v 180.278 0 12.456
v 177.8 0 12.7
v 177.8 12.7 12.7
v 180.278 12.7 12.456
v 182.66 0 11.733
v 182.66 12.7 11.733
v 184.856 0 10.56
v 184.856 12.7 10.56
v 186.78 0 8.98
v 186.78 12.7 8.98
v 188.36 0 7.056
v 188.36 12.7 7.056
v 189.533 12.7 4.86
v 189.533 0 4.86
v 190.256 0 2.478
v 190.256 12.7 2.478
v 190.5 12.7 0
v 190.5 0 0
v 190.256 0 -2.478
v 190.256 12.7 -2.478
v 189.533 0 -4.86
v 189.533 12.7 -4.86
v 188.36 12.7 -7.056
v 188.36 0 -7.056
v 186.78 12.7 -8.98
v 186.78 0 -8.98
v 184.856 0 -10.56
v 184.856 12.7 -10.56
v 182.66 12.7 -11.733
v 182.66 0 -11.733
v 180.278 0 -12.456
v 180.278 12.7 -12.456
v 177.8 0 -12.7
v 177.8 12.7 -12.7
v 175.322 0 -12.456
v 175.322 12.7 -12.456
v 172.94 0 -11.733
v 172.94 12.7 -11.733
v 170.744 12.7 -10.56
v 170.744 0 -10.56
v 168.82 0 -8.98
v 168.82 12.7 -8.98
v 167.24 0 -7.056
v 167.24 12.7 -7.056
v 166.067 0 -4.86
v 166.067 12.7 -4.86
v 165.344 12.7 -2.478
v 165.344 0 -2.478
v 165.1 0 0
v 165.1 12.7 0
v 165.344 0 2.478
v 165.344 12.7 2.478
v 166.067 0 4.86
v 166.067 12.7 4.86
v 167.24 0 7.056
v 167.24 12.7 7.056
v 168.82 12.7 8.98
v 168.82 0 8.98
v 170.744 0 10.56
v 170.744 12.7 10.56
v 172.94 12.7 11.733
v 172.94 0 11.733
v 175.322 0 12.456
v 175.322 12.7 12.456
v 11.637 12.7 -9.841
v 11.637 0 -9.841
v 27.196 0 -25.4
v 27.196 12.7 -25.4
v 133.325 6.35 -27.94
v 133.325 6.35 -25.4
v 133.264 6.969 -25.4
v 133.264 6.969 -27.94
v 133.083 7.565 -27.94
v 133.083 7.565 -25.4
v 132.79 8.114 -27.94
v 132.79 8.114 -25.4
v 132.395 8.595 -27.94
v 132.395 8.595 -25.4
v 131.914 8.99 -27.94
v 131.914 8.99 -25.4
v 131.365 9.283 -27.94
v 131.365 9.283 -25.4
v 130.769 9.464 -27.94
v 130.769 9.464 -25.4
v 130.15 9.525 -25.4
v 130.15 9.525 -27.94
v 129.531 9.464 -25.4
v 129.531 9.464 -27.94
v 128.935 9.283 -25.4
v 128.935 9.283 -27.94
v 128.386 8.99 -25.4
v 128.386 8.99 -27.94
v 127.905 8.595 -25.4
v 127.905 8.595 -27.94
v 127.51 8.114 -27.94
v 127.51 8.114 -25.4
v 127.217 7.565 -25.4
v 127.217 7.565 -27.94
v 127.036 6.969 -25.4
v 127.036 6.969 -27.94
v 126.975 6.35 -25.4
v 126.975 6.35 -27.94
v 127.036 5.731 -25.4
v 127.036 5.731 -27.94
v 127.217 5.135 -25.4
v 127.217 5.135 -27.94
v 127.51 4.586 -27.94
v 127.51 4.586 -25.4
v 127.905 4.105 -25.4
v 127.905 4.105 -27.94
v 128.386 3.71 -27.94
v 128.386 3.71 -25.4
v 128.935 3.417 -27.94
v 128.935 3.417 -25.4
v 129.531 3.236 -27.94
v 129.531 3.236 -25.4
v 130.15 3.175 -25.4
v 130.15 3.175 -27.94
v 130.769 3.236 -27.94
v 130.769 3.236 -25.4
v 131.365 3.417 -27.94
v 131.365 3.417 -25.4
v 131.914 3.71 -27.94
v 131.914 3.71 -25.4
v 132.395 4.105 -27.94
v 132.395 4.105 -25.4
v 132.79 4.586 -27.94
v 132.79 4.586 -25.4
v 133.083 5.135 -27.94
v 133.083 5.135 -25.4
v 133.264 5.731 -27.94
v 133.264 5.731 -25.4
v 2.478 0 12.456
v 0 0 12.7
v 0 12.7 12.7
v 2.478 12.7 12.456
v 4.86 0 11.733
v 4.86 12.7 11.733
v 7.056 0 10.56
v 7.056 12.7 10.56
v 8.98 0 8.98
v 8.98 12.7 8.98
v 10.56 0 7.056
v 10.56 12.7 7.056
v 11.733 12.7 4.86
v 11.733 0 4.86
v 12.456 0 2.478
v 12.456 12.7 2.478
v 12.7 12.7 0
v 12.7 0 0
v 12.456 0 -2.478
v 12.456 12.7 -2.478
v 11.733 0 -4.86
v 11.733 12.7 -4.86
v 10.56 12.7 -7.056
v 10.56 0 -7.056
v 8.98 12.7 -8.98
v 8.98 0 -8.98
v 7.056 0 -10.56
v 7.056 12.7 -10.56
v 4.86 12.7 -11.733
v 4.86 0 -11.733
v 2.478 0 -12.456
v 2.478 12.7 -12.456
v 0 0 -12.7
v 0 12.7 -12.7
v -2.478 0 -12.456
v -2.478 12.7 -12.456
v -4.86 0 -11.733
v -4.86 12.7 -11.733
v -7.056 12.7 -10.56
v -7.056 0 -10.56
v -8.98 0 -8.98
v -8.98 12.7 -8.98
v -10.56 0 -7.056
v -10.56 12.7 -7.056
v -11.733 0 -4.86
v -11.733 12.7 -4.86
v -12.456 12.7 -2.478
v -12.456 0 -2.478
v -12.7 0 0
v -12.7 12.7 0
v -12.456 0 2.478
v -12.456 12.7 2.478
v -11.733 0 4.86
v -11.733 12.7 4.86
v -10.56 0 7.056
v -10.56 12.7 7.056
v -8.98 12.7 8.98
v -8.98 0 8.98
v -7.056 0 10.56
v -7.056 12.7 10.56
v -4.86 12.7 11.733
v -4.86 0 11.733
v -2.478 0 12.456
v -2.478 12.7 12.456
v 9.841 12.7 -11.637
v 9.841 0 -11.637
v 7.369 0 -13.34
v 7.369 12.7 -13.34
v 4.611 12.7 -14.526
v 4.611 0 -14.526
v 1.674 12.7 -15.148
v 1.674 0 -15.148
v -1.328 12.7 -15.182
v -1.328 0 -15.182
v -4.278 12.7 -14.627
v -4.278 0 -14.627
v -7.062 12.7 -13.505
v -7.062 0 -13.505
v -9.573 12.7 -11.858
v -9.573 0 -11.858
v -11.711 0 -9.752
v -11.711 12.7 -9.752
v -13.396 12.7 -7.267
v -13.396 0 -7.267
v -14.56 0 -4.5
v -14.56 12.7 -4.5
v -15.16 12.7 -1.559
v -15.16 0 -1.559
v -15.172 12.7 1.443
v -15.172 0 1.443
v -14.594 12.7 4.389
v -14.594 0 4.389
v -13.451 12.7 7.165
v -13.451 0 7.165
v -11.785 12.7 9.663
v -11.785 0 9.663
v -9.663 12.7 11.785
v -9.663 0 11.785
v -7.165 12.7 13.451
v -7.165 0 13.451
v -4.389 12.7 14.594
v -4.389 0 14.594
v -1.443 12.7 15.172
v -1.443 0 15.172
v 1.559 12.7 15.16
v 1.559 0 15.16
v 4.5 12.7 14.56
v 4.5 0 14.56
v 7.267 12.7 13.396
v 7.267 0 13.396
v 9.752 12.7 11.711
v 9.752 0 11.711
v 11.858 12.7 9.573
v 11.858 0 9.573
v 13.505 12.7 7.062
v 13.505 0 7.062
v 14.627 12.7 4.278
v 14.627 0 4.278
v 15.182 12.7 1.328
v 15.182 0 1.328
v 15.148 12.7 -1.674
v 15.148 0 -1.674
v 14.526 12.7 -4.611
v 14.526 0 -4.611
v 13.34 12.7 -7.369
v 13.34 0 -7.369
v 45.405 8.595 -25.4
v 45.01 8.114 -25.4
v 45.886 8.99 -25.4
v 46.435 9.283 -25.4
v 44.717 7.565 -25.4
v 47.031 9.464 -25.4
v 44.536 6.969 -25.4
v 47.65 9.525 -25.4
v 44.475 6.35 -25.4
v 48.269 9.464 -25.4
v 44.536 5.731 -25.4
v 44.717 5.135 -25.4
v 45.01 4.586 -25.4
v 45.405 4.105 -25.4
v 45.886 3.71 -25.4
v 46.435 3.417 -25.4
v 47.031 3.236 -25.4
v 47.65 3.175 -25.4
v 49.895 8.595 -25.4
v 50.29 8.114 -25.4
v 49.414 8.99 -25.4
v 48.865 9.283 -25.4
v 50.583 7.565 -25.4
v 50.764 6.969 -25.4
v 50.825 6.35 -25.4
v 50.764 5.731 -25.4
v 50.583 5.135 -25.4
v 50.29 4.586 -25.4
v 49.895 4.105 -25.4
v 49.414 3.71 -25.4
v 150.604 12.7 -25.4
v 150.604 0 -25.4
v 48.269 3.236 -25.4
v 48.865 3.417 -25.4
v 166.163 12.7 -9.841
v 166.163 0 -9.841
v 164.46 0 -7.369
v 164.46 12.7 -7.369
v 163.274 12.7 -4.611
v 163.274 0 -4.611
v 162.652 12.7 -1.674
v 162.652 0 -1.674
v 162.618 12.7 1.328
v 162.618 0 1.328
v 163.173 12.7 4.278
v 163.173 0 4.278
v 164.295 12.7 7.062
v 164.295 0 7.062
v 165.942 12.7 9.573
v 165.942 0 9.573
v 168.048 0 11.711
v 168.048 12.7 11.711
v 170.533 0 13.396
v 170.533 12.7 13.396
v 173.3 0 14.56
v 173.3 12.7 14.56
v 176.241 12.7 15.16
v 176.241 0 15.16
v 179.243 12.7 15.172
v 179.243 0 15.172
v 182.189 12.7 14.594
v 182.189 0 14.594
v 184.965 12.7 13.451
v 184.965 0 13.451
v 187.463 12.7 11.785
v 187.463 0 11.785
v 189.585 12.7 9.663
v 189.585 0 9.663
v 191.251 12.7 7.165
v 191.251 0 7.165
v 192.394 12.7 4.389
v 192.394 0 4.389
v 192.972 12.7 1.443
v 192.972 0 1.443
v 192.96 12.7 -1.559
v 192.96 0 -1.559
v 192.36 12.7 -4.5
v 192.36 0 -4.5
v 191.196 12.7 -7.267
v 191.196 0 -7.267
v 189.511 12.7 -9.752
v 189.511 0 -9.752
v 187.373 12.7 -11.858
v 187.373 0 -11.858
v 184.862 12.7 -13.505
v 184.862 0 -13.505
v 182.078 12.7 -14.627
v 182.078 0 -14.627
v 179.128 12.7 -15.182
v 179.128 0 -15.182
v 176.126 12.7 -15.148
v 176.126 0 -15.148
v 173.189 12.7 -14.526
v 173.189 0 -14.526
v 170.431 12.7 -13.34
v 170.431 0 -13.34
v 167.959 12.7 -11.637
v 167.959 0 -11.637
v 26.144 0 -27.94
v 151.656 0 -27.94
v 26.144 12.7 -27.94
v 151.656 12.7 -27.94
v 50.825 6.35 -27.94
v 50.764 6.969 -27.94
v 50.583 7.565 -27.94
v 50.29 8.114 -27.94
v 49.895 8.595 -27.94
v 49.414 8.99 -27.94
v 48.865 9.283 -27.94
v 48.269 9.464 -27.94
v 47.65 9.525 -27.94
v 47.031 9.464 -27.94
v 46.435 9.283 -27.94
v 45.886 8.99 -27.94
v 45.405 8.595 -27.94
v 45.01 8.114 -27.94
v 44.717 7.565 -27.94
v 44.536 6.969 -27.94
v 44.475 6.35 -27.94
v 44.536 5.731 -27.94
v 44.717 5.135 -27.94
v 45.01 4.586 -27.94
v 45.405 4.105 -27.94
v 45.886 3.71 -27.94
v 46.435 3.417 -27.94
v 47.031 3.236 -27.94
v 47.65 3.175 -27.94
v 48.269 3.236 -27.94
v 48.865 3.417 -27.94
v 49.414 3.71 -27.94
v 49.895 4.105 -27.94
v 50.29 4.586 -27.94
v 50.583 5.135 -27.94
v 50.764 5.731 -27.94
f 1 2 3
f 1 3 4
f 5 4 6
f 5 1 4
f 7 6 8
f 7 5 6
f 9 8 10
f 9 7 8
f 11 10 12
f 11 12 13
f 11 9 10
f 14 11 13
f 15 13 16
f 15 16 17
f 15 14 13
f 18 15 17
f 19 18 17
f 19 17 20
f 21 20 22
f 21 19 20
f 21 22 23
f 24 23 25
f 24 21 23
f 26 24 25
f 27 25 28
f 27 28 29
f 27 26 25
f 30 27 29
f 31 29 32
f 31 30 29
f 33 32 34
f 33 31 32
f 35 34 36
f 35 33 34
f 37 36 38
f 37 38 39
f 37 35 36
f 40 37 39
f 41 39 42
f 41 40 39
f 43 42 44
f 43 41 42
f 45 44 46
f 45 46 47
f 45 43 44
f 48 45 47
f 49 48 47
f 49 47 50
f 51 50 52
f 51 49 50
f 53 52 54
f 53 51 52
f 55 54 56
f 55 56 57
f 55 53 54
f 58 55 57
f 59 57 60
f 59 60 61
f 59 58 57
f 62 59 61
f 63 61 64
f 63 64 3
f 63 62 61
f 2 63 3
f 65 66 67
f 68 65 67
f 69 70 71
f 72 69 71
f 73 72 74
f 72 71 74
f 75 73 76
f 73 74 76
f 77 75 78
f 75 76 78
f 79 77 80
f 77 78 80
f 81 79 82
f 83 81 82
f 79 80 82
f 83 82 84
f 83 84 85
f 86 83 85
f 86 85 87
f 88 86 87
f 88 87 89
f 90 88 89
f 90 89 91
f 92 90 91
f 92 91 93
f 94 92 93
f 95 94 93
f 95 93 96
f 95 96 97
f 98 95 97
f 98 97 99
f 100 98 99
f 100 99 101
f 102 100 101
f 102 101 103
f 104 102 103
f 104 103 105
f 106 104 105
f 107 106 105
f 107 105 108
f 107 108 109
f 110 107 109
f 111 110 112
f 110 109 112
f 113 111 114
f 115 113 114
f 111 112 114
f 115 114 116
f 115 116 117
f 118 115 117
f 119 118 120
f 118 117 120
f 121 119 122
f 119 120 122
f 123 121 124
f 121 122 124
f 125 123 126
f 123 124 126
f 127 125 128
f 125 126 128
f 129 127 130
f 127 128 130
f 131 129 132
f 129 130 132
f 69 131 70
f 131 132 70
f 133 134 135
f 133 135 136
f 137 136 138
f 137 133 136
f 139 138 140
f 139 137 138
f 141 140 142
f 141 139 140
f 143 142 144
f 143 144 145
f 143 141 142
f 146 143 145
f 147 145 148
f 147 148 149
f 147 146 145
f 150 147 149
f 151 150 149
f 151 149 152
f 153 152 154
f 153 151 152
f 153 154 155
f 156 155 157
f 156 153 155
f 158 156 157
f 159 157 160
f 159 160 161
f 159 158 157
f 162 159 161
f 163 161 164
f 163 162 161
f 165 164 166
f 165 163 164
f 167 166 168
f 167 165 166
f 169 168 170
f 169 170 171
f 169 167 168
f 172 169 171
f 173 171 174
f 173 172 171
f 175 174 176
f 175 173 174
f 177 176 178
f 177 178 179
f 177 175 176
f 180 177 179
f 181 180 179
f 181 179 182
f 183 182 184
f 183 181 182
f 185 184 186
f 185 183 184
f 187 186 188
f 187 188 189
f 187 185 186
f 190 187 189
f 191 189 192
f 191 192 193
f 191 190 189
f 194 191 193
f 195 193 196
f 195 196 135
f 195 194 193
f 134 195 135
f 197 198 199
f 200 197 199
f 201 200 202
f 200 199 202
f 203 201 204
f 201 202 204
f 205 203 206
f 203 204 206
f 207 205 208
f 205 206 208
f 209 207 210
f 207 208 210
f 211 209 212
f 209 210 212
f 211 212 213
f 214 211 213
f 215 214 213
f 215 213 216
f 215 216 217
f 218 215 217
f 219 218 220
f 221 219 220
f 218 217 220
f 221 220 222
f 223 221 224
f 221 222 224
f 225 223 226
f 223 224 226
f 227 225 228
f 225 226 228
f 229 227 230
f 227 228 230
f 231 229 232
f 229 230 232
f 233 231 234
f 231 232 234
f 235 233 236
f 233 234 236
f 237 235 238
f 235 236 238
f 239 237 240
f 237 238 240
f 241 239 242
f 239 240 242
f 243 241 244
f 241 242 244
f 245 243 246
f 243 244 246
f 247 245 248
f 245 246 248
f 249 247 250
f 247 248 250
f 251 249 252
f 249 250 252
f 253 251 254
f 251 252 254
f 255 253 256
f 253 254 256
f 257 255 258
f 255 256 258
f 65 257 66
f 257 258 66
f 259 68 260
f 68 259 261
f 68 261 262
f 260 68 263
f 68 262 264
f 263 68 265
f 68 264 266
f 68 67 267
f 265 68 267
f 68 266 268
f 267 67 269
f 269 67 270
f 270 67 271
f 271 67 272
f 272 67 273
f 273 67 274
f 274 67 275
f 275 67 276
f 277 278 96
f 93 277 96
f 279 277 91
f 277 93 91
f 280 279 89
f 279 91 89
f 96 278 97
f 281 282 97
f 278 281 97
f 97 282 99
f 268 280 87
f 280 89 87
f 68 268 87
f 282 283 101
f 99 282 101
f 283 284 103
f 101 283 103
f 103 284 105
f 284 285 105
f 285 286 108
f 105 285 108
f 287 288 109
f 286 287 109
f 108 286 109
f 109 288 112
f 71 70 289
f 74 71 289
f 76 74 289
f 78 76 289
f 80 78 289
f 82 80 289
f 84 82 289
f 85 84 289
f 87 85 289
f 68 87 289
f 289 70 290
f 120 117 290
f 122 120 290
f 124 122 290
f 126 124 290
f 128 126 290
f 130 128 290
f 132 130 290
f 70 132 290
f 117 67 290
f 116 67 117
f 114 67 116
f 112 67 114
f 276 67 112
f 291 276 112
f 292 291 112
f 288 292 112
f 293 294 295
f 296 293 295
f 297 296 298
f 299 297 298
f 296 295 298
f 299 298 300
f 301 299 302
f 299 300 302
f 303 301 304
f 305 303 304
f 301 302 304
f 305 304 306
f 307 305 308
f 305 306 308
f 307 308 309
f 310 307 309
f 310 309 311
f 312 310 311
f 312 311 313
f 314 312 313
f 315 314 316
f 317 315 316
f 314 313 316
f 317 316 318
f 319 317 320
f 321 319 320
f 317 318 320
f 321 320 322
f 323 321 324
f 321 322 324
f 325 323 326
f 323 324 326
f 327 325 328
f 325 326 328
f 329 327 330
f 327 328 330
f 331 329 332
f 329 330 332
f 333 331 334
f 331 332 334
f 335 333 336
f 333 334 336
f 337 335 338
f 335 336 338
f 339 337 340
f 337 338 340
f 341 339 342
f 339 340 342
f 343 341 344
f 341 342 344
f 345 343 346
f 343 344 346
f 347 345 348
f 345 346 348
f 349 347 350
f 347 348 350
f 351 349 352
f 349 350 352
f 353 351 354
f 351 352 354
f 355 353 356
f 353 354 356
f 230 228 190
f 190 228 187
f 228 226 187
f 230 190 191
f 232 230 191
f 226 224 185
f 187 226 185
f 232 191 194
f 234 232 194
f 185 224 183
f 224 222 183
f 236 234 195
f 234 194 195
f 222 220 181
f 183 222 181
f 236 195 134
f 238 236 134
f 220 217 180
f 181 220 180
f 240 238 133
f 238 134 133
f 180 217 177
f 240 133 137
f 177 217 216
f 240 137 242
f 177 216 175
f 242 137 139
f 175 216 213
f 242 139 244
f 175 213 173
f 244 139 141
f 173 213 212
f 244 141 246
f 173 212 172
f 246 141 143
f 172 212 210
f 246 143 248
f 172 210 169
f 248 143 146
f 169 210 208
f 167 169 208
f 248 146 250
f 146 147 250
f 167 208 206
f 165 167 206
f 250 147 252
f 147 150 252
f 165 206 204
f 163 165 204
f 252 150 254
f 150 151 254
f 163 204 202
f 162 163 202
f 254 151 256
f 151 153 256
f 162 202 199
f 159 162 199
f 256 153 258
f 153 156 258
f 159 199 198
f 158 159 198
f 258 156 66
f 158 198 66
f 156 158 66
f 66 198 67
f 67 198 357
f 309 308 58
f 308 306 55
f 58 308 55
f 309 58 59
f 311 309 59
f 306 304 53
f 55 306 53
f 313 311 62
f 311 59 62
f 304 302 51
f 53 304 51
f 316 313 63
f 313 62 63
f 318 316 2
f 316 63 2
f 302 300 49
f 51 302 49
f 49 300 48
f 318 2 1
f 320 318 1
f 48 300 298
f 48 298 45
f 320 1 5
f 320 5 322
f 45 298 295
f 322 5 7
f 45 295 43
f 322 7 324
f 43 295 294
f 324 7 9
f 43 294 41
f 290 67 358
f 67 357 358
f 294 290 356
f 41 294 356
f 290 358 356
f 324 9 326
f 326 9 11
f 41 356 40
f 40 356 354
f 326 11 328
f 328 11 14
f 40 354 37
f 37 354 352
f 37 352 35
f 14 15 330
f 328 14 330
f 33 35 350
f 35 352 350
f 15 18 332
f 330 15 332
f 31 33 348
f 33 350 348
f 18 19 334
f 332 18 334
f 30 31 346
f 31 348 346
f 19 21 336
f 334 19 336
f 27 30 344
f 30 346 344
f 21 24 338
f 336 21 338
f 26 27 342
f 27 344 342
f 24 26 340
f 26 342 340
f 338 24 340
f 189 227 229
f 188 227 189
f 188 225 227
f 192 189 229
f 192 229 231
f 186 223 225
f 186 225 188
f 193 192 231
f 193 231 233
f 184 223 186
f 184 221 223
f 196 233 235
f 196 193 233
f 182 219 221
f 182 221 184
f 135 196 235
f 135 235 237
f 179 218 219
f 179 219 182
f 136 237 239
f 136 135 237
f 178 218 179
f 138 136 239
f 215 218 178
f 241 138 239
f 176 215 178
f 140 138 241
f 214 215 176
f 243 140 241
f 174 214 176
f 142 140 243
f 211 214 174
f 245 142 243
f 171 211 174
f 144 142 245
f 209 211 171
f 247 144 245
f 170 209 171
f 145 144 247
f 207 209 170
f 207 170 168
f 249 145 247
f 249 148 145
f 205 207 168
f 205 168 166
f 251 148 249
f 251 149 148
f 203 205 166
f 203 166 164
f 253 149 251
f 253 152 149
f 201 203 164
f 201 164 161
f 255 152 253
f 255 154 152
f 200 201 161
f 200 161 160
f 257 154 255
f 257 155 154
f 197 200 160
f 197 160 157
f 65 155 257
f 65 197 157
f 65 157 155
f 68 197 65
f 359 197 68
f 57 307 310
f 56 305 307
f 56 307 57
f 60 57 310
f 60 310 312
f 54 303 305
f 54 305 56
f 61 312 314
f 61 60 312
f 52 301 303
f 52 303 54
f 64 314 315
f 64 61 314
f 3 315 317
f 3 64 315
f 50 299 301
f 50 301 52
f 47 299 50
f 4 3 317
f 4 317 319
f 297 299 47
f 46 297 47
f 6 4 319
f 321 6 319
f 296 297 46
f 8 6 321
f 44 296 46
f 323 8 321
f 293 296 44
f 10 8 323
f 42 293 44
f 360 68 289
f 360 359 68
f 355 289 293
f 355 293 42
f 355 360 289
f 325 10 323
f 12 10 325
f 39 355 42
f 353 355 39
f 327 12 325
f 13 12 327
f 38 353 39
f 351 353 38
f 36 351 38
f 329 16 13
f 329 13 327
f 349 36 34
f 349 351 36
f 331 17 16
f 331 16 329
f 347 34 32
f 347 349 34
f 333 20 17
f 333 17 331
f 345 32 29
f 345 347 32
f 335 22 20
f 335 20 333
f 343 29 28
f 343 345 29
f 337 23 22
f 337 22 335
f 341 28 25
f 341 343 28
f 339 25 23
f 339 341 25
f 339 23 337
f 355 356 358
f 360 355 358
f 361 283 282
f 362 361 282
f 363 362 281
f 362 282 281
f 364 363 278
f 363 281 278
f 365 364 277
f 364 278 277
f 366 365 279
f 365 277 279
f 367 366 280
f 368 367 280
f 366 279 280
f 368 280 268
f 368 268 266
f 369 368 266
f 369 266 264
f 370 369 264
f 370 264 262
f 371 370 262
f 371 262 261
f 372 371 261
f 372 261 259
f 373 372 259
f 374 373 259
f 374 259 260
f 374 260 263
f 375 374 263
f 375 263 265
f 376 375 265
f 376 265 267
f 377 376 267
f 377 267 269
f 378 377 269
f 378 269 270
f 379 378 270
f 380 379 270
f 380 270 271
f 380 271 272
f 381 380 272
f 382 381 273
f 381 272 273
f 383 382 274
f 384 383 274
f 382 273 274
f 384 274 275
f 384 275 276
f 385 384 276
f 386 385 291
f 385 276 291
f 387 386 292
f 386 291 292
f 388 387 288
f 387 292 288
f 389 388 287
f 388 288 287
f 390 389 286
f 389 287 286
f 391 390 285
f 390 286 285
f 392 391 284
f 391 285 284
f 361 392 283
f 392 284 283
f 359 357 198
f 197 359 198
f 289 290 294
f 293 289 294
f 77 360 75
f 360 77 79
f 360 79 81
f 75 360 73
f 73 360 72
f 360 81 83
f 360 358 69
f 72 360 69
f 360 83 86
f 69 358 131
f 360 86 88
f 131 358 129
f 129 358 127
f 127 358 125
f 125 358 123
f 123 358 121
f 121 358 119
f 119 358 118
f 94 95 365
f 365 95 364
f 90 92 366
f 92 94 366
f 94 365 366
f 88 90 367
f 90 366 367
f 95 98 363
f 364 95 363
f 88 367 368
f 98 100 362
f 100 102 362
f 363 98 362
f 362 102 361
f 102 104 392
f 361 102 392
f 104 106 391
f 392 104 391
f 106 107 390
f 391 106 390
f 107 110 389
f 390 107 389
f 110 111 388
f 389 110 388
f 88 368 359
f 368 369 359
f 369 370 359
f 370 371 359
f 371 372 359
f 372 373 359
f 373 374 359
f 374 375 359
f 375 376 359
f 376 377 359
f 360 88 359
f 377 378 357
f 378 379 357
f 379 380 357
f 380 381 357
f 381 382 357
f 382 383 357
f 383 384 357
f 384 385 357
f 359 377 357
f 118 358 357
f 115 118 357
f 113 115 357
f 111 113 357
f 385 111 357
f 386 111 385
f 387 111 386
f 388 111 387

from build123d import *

# Parameters (mm, degrees)
SKETCH1_R           = 12.7
BOSS_EXTRUDE1_DEPTH = 12.7
SKETCH2_R           = 3.175
CUT_EXTRUDE1_DEPTH  = 12.7


with BuildPart() as part:
    # Sketch1 → Boss-Extrude1 (new body)
    with BuildSketch(Plane(origin=(0, 0, 0), x_dir=(1, 0, 0), z_dir=(0, 1, 0))):
        with BuildLine():
            Line((11.636850036, 9.840798811), (27.196051224, 25.4))
            Line((27.196051224, 25.4), (150.603948776, 25.4))
            Line((150.603948776, 25.4), (166.163149964, 9.840798811))
            ThreePointArc((166.163149964, 9.840798811), (188.576307345, -10.776307345), (167.959201189, 11.636850036))
            Line((167.959201189, 11.636850036), (151.656051224, 27.94))
            Line((151.656051224, 27.94), (26.143948776, 27.94))
            Line((26.143948776, 27.94), (9.840798811, 11.636850036))
            ThreePointArc((9.840798811, 11.636850036), (-10.776307345, -10.776307345), (11.636850036, 9.840798811))
        make_face()
        Circle(SKETCH1_R, mode=Mode.SUBTRACT)
        with Locations((177.8, 0)):
            Circle(SKETCH1_R, mode=Mode.SUBTRACT)
    extrude(amount=BOSS_EXTRUDE1_DEPTH)

    # Sketch2 → Cut-Extrude1 (cut)
    with BuildSketch(Plane.XY.offset(-25.4)):
        with Locations((47.64999995, 6.35)):
            Circle(SKETCH2_R)
        with Locations((130.15000005, 6.35)):
            Circle(SKETCH2_R)
    extrude(amount=-CUT_EXTRUDE1_DEPTH, mode=Mode.SUBTRACT)


solid = part.part
